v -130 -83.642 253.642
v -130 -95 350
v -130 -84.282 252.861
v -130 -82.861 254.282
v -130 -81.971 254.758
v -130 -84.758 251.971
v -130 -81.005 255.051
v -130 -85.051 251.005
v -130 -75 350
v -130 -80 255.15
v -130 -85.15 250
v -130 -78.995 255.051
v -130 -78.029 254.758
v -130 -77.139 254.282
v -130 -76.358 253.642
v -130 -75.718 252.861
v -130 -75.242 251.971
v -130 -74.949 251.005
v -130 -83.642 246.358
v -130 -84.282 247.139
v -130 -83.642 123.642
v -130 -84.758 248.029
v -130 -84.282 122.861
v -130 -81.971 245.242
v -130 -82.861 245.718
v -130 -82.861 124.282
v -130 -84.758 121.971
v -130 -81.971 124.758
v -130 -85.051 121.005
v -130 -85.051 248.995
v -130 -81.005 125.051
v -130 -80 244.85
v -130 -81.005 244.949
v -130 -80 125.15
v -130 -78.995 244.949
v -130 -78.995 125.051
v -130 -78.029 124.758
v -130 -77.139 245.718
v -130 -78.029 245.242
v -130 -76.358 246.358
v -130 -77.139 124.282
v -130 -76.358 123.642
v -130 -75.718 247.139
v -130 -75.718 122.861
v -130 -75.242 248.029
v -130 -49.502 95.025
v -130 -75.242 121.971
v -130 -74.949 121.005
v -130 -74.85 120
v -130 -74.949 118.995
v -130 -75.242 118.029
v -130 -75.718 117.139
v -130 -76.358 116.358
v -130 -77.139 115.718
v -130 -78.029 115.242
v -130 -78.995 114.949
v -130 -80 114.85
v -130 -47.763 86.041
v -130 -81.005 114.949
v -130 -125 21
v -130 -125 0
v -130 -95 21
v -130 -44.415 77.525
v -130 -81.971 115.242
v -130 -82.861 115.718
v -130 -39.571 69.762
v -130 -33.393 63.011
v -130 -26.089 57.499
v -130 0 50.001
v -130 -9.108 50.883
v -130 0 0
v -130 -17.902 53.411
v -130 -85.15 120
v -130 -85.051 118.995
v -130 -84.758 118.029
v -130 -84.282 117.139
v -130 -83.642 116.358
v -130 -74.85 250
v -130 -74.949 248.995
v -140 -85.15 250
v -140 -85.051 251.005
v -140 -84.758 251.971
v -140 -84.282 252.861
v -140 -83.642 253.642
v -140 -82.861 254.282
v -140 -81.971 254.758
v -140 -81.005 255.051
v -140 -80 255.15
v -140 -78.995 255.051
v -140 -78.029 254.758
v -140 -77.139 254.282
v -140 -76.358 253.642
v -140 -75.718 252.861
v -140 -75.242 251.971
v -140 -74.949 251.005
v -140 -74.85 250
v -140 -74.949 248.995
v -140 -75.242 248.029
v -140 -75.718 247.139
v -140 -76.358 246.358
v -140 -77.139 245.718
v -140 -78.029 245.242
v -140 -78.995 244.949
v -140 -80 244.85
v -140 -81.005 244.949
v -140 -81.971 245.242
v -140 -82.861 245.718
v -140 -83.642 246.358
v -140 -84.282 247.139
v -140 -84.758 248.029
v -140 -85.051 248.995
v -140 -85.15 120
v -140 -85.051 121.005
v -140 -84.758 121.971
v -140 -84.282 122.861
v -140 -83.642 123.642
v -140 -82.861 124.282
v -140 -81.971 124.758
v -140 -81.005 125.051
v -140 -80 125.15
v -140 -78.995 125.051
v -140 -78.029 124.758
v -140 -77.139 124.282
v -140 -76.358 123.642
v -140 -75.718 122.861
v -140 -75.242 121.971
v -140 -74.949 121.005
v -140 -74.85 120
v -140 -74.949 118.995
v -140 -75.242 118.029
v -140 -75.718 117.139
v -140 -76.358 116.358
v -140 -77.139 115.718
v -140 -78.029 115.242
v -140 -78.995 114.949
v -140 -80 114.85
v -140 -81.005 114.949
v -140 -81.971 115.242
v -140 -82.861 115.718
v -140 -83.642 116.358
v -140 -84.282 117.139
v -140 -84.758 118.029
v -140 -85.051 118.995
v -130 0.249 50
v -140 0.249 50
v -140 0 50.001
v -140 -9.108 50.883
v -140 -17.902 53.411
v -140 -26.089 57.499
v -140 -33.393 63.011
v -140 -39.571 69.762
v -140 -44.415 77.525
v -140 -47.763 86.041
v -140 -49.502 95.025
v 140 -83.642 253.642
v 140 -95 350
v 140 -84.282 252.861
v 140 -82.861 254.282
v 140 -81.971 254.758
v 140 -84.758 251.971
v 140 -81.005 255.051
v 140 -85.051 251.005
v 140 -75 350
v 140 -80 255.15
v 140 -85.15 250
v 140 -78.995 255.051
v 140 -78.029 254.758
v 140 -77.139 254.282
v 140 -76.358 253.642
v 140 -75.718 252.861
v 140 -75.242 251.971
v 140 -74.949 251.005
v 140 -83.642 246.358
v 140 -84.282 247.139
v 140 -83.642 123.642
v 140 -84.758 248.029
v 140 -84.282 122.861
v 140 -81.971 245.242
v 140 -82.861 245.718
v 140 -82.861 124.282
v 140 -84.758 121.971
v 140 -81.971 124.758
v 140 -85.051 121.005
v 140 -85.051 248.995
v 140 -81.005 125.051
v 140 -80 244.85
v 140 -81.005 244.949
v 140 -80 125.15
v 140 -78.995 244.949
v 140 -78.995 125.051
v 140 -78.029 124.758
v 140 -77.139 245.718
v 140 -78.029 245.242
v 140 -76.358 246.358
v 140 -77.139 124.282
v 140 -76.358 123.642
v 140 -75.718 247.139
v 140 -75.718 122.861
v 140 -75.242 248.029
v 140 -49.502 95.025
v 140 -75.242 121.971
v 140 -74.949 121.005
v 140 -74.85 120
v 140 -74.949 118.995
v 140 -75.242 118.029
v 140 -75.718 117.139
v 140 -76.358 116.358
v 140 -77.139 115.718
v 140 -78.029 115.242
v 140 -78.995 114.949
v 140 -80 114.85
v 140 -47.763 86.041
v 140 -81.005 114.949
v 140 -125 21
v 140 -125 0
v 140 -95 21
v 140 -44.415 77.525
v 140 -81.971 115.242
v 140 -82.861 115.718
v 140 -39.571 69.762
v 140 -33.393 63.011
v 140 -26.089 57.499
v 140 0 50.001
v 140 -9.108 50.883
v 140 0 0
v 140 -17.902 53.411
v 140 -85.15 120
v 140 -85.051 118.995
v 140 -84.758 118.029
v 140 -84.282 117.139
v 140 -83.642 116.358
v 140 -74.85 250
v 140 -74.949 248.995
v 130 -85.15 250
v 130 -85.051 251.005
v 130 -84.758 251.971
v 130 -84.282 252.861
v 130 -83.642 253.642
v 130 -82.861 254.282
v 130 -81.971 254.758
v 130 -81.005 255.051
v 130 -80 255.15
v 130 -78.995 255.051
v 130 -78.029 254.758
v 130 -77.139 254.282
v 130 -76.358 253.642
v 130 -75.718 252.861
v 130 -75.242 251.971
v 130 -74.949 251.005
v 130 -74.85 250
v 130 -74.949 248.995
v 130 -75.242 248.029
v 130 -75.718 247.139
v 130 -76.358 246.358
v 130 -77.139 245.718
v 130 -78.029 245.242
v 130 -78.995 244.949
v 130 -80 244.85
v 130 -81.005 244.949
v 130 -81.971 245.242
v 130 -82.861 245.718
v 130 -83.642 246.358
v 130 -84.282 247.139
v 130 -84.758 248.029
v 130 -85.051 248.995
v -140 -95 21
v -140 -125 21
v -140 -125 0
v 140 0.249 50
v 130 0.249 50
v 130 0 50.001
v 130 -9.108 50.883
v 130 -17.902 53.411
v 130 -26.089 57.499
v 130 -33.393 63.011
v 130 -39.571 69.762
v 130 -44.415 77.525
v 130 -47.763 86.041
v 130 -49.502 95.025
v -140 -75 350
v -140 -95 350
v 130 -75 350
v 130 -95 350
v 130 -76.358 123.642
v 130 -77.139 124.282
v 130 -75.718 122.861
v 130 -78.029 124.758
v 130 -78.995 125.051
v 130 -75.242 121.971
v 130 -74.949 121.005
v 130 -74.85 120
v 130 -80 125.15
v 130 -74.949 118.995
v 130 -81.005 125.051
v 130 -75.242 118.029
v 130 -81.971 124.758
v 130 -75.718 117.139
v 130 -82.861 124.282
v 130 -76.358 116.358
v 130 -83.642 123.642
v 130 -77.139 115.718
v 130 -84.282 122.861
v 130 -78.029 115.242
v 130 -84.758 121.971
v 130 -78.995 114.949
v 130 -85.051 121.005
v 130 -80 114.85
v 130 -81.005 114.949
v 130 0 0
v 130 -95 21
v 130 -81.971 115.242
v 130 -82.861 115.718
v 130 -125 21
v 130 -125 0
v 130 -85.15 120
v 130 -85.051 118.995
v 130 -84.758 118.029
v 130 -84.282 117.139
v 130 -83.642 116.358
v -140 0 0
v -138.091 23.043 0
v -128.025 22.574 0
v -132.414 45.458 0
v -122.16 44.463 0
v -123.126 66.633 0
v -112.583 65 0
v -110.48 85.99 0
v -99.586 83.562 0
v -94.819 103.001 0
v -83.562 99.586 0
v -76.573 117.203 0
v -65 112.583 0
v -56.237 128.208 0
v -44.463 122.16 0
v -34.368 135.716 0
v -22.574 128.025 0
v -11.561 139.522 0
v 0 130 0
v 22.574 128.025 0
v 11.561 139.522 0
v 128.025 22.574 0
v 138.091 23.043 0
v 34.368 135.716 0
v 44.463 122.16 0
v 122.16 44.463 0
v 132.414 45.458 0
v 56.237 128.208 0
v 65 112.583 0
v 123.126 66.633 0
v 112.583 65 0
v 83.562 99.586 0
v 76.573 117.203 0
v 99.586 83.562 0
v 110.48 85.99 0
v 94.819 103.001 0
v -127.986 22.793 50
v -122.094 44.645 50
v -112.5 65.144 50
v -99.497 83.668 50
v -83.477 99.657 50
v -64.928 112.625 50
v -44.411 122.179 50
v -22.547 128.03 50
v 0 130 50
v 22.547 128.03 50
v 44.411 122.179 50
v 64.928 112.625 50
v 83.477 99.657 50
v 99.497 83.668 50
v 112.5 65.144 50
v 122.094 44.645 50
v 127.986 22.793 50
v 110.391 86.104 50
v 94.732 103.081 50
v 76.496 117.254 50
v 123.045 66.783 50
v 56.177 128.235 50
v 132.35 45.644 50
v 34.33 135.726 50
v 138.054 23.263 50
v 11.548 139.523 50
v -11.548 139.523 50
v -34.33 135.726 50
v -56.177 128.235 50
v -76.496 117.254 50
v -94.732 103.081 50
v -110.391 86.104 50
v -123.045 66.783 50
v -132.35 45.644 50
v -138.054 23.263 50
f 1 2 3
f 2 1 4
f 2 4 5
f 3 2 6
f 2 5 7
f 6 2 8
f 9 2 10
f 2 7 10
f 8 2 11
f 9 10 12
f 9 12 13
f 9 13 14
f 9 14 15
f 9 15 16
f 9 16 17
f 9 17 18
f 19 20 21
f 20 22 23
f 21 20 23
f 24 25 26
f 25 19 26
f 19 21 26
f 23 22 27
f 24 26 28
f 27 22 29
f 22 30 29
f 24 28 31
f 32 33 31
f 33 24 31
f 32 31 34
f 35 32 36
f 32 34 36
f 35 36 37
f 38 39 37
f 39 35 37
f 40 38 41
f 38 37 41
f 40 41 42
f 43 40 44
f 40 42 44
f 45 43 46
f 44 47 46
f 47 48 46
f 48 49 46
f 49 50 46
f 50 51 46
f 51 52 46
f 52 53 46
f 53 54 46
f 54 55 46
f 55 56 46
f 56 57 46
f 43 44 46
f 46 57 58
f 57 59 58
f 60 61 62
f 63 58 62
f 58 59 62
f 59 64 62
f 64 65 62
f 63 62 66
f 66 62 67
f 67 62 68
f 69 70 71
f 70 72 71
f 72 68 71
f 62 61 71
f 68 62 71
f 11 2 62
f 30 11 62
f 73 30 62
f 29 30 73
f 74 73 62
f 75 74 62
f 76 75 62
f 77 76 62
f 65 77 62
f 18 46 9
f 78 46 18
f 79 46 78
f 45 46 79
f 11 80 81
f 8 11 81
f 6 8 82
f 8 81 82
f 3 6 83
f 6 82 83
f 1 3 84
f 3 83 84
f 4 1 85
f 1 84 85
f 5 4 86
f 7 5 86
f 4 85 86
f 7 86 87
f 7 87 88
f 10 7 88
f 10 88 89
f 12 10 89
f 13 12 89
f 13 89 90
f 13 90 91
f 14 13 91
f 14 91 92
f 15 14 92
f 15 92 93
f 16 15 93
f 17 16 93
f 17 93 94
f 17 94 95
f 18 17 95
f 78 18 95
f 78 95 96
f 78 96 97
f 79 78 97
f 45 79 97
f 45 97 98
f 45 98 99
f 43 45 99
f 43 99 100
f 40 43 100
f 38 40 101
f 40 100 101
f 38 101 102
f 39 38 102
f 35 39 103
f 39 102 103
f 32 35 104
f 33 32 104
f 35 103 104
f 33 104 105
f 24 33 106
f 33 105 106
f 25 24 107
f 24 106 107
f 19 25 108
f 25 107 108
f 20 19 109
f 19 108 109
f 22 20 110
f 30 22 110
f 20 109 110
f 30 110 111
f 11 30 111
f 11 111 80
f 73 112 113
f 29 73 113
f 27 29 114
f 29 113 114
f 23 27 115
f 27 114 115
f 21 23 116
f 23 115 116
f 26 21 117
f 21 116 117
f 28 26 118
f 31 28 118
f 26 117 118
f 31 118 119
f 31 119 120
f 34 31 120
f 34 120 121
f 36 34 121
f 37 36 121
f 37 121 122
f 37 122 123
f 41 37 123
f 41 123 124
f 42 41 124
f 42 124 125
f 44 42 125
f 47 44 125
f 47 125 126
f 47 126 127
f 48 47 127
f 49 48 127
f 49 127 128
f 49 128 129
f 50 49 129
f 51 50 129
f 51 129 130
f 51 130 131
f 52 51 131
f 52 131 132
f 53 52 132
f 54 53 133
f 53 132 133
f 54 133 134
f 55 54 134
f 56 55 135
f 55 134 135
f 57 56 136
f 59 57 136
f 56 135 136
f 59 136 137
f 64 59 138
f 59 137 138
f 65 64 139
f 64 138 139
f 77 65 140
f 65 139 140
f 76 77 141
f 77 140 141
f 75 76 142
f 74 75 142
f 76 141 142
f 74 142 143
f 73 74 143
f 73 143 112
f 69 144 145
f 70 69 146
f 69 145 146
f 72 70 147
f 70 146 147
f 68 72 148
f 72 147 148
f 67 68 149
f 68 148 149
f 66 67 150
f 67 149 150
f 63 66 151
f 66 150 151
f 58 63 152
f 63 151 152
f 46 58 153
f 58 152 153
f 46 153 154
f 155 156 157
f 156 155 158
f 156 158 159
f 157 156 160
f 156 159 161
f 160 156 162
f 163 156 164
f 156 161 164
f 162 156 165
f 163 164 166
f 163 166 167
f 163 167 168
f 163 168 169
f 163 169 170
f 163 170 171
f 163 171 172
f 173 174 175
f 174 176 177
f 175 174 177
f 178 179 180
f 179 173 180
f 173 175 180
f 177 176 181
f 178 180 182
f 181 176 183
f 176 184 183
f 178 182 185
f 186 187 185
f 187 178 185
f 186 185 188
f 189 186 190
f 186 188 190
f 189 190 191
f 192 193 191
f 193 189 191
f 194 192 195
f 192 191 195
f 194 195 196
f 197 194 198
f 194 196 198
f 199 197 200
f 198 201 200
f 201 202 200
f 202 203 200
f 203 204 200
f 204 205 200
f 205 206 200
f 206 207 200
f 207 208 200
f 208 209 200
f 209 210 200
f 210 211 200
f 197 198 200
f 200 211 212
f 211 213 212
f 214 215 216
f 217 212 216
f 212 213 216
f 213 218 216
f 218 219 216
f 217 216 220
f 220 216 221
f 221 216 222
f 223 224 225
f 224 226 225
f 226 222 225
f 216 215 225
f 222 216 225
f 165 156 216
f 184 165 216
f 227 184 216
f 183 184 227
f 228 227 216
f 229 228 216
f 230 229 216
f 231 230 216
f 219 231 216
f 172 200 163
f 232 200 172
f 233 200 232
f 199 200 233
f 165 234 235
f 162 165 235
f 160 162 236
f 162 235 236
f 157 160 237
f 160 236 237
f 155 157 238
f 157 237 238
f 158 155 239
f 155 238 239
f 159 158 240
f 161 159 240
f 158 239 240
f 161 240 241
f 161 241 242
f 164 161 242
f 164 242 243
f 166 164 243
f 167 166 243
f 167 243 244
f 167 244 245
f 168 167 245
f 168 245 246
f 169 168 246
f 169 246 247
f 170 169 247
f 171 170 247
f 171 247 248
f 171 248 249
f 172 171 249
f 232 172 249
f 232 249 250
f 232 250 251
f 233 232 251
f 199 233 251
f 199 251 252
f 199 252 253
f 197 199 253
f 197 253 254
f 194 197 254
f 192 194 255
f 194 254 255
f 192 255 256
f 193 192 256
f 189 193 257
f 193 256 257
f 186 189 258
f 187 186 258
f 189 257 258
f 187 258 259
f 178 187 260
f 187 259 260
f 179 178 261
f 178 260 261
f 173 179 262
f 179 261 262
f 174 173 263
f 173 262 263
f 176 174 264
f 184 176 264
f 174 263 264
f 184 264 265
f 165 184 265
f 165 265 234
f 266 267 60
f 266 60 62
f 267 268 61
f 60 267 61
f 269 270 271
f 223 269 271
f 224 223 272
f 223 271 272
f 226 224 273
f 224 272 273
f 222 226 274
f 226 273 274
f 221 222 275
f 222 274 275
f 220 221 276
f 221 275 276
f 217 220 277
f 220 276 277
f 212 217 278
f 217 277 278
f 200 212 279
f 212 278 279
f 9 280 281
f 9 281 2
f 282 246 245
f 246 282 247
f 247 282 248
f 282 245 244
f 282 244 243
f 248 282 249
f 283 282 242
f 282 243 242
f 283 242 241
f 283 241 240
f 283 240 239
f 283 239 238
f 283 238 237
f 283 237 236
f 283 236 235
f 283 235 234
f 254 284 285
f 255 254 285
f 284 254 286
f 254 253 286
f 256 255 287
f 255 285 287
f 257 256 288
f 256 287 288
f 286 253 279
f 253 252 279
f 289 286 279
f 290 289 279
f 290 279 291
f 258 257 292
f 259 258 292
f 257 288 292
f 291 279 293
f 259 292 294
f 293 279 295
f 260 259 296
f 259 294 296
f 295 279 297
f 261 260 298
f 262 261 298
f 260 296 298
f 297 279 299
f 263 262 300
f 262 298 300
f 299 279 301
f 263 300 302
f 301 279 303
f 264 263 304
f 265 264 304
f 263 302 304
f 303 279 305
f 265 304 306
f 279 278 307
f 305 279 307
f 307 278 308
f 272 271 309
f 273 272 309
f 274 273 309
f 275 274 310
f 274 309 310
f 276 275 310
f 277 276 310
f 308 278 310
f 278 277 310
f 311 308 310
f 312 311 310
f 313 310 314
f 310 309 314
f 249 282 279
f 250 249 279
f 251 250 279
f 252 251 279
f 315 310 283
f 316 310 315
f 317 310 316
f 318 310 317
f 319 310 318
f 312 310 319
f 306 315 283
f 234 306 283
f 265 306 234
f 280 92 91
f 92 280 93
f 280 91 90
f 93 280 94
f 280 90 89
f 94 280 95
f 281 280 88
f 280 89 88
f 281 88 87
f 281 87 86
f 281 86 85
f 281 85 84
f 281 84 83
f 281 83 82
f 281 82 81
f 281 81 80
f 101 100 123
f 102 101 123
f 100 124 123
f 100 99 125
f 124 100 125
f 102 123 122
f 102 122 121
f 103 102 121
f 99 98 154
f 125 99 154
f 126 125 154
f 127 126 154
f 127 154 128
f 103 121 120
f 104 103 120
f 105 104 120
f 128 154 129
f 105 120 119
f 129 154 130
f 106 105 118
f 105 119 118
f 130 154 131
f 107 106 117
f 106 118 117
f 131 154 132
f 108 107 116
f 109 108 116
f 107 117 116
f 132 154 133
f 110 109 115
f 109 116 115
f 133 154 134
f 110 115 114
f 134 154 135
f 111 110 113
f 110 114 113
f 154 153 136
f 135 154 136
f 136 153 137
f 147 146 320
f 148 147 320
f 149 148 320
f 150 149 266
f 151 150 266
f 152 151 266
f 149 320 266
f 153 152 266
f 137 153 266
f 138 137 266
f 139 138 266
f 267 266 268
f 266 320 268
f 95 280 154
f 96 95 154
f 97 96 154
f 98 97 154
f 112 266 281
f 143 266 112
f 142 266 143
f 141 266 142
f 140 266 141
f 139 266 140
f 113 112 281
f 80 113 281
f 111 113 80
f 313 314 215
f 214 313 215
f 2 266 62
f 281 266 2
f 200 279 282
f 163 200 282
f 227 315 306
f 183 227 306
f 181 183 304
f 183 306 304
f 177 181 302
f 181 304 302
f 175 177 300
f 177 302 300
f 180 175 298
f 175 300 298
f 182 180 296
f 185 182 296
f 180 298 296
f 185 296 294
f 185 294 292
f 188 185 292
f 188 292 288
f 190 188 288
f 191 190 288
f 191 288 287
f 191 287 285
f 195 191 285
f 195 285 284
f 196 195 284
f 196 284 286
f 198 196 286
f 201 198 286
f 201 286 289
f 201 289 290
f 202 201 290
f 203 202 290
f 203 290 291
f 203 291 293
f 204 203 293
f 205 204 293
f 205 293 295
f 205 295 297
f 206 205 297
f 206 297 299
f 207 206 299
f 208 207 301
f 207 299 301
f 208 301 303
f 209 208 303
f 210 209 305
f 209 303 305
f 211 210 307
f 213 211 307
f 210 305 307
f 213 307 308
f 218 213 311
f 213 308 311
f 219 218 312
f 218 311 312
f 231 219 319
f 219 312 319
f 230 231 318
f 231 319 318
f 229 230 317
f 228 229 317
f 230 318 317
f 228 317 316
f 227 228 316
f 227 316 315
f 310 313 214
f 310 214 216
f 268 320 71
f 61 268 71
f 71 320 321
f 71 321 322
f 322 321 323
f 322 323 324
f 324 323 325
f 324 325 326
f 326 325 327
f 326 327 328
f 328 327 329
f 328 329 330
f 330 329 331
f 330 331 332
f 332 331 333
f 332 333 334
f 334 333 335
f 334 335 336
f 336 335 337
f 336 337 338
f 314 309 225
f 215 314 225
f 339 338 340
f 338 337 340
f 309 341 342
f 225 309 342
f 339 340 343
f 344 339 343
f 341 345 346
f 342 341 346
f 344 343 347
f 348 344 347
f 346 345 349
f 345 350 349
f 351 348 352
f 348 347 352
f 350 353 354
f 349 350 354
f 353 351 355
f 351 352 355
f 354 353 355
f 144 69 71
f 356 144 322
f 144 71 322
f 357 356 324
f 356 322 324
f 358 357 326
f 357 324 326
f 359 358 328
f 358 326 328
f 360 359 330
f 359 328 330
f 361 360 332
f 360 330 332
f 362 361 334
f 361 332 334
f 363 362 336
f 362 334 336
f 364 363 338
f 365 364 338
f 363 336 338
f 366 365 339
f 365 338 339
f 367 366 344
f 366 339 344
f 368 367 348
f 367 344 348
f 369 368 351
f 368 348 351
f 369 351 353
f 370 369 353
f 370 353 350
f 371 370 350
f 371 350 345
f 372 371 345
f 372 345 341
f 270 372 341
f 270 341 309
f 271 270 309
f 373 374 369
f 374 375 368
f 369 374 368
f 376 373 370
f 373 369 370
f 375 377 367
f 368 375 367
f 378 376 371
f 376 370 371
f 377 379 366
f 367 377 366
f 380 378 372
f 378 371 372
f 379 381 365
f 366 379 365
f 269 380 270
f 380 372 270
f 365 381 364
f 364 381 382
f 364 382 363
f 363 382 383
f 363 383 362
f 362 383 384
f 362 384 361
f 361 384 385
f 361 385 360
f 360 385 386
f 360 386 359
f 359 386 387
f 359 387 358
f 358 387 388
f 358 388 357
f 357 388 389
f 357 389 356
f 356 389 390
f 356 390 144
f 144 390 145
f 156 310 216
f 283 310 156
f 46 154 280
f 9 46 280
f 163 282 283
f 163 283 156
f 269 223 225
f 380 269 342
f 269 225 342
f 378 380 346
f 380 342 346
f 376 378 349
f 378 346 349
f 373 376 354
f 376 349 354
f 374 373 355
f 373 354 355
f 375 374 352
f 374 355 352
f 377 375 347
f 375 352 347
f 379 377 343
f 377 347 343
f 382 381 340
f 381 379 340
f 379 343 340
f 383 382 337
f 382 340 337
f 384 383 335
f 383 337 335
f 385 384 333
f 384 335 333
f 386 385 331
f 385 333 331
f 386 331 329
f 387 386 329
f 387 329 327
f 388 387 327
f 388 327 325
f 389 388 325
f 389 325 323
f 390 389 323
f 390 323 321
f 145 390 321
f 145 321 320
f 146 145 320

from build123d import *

# Parameters (mm, degrees)
EXTRUDE_1_DEPTH     = 350
SKETCH_2_W          = 329
SKETCH_2_H          = 30
CUT_EXTRUDE_1_DEPTH = 470.574275275
SKETCH_3_R          = 5.15
CUT_EXTRUDE_2_DEPTH = 470.574275364


with BuildPart() as part:
    # 草图1 → 凸台-拉伸1 (new body)
    with BuildSketch(Plane.XY):
        with BuildLine():
            Line((-140, 0), (-140, -125))
            Line((-140, -125), (-130, -125))
            Line((-130, -125), (-130, 0))
            ThreePointArc((-130, 0), (0, 130), (130, 0))
            Line((130, 0), (130, -125))
            Line((130, -125), (140, -125))
            Line((140, -125), (140, 0))
            ThreePointArc((140, 0), (0, 140), (-140, 0))
        make_face()
    extrude(amount=EXTRUDE_1_DEPTH)

    # 草图2 → 切除-拉伸1 (cut, through all)
    with BuildSketch(Plane.ZY.offset(140)):
        with Locations((185.5, -110)):
            Rectangle(SKETCH_2_W, SKETCH_2_H)
        with BuildLine():
            Line((50, 140), (50, 0.249378106))
            ThreePointArc((50, 0.249378106), (62.927373322, -33.300887932), (95.024814049, -49.502481405))
            Line((95.024814049, -49.502481405), (350, -75))
            Line((350, -75), (350, 140))
            Line((350, 140), (50, 140))
        make_face()
    extrude(amount=-CUT_EXTRUDE_1_DEPTH, mode=Mode.SUBTRACT)

    # 草图3 → 切除-拉伸2 (cut, through all)
    with BuildSketch(Plane.ZY.offset(140)):
        with Locations(Location((120, -80, 0), (0, 0, 270))):
            Circle(SKETCH_3_R)
        with Locations(Location((250, -80, 0), (0, 0, 270))):
            Circle(SKETCH_3_R)
    extrude(amount=-CUT_EXTRUDE_2_DEPTH, mode=Mode.SUBTRACT)


solid = part.part
